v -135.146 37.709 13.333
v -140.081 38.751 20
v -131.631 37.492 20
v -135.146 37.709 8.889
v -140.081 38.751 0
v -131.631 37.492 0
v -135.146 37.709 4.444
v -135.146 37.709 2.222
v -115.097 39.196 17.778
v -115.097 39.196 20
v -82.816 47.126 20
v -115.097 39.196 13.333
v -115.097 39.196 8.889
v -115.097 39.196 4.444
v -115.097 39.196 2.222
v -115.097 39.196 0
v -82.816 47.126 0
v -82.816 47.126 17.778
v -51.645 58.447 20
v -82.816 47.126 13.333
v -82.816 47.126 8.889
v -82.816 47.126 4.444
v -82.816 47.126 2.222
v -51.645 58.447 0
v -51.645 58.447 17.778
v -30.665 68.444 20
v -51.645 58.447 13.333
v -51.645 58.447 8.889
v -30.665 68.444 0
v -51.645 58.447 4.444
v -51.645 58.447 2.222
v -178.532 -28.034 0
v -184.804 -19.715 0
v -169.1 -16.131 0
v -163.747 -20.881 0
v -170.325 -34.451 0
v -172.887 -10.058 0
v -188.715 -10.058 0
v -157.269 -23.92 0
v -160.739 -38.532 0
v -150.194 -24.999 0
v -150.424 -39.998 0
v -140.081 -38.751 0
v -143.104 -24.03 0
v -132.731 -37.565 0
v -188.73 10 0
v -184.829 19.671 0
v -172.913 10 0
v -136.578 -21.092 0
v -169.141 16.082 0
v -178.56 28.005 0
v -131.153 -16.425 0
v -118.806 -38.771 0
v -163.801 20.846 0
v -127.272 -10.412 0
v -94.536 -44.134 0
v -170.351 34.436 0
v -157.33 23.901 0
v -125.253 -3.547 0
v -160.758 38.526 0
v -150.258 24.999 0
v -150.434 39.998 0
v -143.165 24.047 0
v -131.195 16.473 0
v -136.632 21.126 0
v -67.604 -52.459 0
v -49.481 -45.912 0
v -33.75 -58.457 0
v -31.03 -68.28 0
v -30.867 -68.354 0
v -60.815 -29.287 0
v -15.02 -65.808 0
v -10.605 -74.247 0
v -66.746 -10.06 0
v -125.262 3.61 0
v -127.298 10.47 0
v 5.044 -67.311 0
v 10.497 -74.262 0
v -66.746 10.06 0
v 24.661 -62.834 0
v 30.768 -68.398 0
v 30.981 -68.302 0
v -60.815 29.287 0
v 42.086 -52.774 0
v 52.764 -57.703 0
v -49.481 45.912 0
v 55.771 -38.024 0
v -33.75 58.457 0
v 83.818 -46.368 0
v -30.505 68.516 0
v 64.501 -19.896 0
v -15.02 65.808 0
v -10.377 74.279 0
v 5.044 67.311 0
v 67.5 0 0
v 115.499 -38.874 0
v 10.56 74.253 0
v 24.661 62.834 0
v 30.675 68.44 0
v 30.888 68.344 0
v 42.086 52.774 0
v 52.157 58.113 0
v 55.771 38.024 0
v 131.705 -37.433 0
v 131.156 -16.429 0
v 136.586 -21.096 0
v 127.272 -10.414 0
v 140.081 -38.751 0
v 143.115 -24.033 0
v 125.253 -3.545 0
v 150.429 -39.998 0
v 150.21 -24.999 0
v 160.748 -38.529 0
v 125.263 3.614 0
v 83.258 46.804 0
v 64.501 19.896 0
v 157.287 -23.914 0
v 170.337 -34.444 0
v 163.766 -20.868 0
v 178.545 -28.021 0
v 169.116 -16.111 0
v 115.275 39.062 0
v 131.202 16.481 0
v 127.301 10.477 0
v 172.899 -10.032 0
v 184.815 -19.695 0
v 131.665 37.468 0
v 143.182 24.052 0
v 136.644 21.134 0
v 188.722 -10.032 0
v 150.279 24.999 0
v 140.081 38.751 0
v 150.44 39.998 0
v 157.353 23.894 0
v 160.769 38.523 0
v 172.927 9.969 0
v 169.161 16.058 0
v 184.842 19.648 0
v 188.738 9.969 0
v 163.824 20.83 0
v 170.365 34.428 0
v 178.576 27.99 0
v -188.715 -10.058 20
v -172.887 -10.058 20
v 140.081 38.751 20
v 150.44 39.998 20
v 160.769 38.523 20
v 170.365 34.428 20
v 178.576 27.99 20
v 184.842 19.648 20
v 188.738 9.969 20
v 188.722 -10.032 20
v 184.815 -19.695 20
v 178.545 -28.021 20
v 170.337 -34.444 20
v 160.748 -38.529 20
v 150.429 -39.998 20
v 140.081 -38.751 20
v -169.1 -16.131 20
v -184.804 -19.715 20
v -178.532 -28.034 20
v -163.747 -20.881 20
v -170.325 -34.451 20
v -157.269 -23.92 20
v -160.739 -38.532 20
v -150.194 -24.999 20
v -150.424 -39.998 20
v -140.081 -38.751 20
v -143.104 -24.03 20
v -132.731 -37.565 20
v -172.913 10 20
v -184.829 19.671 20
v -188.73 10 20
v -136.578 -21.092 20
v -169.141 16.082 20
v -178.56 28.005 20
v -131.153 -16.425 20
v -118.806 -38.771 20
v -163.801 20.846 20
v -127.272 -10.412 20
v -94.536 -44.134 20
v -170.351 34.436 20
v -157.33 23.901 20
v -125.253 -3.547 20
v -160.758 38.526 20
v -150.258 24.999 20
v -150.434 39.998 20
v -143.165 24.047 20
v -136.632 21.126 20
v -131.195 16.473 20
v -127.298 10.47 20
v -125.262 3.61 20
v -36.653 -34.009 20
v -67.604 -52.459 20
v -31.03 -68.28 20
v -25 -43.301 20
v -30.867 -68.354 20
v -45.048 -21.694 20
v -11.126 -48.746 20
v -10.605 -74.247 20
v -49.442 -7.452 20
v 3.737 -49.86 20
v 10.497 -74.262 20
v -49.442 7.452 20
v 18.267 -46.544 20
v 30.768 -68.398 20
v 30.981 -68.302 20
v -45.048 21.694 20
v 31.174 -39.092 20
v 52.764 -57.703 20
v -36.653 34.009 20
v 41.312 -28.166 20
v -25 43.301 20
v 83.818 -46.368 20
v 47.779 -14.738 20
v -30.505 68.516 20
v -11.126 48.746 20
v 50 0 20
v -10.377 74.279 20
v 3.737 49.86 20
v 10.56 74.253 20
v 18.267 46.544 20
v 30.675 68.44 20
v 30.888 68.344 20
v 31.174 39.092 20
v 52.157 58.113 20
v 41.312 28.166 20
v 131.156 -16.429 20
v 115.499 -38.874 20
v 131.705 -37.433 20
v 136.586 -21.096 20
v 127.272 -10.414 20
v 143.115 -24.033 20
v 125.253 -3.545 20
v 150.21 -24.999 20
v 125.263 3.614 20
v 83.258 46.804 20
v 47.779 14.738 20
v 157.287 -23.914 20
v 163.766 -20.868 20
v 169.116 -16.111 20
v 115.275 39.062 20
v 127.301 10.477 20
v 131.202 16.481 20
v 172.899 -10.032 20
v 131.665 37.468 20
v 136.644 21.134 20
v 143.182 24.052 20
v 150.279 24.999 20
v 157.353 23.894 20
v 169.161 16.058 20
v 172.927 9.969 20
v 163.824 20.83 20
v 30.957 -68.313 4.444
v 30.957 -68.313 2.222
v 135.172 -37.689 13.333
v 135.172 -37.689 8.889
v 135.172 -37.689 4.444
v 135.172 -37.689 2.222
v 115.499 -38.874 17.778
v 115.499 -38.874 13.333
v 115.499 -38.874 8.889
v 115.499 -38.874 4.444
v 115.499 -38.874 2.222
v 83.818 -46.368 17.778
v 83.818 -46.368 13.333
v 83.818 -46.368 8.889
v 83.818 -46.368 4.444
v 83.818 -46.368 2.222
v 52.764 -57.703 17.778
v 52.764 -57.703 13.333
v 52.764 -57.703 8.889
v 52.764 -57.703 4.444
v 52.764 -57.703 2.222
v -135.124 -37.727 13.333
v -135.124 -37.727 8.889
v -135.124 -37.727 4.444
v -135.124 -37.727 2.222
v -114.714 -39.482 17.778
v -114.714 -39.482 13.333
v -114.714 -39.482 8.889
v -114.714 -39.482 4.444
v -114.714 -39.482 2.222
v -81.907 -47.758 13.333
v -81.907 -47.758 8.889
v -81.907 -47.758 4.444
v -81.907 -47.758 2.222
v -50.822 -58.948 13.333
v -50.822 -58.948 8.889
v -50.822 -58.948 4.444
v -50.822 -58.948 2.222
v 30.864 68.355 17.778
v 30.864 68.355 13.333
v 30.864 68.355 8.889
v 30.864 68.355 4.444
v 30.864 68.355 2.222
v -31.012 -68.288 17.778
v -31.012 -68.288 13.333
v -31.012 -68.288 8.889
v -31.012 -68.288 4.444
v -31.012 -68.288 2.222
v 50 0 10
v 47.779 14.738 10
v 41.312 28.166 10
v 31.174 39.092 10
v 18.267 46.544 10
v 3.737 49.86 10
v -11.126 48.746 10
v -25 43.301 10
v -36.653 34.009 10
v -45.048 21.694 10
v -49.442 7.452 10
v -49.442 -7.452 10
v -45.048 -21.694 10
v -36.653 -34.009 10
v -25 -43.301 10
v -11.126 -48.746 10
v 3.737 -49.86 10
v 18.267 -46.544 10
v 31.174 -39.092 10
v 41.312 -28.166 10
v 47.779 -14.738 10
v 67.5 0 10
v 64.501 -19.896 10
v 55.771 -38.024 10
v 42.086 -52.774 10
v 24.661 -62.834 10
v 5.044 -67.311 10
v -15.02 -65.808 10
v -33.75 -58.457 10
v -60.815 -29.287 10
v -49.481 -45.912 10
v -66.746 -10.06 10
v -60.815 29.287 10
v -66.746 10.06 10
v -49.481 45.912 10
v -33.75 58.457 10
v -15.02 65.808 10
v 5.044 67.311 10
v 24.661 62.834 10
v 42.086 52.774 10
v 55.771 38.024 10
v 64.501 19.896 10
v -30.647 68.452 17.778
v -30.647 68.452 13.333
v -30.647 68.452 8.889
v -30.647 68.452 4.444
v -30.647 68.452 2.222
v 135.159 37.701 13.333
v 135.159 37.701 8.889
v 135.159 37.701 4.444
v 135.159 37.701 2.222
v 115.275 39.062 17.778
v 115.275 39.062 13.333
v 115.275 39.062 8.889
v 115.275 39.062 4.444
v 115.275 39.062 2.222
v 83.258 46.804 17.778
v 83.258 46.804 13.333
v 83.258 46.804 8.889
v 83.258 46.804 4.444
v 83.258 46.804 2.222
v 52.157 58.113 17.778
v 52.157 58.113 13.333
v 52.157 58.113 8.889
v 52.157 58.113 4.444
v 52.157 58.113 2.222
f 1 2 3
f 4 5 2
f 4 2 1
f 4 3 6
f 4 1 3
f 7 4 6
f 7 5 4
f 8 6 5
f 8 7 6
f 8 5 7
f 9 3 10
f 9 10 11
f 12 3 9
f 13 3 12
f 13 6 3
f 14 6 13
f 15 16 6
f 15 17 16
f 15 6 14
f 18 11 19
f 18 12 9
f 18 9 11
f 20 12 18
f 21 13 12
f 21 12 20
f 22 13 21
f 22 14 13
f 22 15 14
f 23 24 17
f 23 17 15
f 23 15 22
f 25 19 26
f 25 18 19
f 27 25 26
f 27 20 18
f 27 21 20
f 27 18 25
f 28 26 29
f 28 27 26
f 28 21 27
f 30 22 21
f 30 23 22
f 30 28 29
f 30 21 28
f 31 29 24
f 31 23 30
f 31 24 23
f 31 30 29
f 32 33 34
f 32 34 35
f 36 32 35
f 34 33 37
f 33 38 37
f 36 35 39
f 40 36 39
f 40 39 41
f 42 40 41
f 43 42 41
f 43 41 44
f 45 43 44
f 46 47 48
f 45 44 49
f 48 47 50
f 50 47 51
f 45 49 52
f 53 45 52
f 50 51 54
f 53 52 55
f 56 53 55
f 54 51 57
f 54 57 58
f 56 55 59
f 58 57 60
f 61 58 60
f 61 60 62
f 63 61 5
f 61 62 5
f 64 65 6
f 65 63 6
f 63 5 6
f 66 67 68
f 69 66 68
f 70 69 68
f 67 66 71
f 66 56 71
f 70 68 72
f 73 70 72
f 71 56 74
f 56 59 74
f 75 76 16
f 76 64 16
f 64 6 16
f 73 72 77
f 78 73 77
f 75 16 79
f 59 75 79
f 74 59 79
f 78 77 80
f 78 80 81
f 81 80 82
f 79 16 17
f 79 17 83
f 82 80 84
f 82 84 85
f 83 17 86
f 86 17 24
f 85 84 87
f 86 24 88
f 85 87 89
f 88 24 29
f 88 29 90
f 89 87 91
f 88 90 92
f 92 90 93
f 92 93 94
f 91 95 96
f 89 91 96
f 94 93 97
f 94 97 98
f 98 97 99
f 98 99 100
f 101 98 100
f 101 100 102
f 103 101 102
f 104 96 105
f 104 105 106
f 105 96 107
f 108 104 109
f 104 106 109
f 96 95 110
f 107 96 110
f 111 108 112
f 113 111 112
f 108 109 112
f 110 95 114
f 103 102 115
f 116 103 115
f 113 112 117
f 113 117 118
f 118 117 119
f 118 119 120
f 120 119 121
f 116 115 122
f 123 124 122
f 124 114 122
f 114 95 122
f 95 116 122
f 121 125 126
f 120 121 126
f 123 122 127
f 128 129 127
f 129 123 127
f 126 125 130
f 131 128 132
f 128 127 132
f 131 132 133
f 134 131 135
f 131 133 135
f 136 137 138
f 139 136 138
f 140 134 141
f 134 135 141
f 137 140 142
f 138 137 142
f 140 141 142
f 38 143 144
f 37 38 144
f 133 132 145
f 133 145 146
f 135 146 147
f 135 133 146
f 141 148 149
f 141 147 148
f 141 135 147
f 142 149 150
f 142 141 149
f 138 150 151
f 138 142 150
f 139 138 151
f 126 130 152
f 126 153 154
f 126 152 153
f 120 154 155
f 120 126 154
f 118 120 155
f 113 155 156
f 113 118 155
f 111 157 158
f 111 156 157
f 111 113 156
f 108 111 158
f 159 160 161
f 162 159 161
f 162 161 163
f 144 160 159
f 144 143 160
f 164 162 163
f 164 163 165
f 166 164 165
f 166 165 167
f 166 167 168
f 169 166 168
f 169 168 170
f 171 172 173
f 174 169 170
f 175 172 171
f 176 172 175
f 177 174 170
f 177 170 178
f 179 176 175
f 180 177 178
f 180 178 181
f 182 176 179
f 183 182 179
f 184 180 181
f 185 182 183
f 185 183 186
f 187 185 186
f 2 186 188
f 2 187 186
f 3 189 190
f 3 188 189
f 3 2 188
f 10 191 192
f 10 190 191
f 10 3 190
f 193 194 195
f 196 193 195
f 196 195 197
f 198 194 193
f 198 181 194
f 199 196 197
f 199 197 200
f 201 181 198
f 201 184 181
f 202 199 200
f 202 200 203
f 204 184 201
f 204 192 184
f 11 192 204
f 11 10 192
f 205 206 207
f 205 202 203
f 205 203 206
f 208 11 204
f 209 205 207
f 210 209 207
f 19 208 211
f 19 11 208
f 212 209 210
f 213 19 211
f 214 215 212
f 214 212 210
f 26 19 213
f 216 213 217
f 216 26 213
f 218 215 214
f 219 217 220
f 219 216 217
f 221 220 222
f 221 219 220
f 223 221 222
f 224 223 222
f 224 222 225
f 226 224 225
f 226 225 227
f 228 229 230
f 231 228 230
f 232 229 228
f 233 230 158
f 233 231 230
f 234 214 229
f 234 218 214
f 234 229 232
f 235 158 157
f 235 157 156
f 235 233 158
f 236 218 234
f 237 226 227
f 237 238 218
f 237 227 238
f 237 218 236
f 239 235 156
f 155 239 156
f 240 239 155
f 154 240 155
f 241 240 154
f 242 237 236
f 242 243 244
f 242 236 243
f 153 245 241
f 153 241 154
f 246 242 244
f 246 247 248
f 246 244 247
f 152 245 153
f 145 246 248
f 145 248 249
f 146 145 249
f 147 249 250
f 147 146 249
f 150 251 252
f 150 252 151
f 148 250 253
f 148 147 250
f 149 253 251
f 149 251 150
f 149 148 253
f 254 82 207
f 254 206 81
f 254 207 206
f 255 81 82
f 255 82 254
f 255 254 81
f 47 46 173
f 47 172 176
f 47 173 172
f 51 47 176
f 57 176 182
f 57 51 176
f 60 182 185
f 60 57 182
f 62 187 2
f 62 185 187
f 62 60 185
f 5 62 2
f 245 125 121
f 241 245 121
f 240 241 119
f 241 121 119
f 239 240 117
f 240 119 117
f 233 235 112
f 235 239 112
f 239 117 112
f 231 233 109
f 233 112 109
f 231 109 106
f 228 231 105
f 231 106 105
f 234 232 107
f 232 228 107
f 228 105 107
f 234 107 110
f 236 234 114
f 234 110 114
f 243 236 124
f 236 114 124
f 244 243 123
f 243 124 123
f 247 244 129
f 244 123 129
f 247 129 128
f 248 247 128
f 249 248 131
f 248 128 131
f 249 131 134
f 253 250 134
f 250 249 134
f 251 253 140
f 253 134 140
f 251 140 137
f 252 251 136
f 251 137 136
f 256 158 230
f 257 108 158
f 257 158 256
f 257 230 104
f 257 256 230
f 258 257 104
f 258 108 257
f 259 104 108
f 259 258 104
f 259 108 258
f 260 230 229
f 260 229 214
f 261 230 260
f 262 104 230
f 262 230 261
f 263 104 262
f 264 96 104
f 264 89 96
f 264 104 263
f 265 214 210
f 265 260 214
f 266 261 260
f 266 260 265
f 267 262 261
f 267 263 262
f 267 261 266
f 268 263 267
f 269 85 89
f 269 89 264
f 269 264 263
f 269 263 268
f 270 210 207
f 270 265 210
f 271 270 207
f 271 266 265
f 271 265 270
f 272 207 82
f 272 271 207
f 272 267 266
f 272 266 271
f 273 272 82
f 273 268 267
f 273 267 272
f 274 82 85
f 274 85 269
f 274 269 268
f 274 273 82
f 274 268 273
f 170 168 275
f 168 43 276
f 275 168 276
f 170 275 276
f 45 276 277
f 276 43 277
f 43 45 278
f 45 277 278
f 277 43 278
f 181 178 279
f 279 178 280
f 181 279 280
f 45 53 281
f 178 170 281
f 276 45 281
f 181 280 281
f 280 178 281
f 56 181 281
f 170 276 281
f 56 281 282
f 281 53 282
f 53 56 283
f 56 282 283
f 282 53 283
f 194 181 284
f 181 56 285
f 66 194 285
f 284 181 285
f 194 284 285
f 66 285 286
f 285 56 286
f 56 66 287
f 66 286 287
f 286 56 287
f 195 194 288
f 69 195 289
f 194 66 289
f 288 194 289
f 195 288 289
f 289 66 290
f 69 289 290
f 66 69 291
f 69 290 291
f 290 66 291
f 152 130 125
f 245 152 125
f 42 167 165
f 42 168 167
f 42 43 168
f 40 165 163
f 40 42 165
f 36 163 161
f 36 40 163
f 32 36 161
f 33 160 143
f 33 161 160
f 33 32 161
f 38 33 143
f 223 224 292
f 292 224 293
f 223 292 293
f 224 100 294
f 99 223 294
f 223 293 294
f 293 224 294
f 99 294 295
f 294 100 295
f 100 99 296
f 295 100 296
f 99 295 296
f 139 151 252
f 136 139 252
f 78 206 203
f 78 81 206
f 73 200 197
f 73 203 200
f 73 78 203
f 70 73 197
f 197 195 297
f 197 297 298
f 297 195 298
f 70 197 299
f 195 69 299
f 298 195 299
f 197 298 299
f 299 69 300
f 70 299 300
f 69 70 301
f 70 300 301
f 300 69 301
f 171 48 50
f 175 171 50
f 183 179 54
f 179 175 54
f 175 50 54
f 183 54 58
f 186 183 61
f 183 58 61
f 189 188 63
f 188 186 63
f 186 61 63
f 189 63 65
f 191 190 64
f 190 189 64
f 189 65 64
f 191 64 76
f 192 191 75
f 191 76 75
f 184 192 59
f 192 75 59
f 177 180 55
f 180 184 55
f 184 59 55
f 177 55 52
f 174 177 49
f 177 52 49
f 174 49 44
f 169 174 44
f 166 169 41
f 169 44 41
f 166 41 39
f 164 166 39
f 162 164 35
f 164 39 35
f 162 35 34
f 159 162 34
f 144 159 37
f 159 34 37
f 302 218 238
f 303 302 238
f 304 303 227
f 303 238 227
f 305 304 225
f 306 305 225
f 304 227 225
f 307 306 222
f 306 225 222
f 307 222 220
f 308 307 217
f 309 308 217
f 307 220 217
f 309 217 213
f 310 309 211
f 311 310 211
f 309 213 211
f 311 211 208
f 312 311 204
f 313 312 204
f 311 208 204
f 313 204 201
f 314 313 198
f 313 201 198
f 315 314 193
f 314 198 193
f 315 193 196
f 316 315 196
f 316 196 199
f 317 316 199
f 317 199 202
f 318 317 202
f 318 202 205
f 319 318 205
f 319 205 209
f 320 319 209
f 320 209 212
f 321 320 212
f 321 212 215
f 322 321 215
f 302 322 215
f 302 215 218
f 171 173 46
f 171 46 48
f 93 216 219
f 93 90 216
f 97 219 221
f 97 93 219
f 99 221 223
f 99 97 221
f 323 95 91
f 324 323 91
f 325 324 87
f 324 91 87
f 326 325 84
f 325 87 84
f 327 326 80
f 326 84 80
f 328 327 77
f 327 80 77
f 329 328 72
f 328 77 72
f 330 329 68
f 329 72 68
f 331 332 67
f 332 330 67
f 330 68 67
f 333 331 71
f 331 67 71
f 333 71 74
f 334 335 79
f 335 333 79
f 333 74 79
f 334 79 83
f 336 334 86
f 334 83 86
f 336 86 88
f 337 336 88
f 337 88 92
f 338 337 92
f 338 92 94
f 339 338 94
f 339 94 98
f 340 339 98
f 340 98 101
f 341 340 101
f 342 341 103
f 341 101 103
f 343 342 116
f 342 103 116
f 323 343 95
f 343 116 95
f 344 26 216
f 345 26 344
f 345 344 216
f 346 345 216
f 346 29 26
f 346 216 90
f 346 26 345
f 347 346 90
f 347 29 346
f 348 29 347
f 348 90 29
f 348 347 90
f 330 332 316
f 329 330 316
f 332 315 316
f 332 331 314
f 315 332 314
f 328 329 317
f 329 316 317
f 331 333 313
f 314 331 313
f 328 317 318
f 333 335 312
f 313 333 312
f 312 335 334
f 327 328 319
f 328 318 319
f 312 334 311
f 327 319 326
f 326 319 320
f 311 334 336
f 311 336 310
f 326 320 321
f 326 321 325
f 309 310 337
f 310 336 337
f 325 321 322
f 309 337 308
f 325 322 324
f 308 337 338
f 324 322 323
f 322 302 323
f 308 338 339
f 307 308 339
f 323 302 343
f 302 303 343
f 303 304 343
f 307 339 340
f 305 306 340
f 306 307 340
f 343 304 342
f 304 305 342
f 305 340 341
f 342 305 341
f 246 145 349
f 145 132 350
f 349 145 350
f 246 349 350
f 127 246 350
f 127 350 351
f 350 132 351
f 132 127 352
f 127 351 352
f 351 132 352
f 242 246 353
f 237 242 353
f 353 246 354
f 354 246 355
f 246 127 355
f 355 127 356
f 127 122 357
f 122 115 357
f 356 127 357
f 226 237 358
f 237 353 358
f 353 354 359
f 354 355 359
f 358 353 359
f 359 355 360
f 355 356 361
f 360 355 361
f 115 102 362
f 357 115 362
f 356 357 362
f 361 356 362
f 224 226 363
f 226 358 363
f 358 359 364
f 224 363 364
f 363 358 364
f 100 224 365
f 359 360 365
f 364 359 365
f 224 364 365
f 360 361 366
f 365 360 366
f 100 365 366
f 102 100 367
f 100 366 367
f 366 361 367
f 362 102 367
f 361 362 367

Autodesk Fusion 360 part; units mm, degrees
sketch "Sketch1" plane through (0, 0, 0) normal (0, 0, 1) x (1, 0, 0)
  circle A0 centre (0, 0) radius 50
  circle A1 centre (0, 0) radius 67.5
  line L0 (-188.7298, 10) -> (-172.9129, 10)
  line L1 (-188.7147, -10.0585) -> (-172.8873, -10.0585)
  arc A2 (-172.8873, -10.0585) -> (-172.9129, 10) centre (-150, 0) ccw
  line L2 (190, -0.0314) -> (190, 0.0314)
  line L3 (188.7379, 9.9686) -> (172.9266, 9.9686)
  line L4 (188.7216, -10.0319) -> (172.8989, -10.0319)
  arc A3 (190, -0.0314) -> (190, 0.0314) centre (150, 0) ccw
  arc A4 (172.9266, 9.9686) -> (172.8989, -10.0319) centre (150, 0) ccw
  spline S0 degree 5 poles (-140.0807, 38.7506) (-138.5307, 38.3538) (-135.4703, 37.4053) (-128.0478, 36.7264) (-108.2202, 39.6197) (-74.7434, 48.8035) (-51.6098, 57.8401) (-40.0528, 63.8063) (-33.7446, 67.0737) (-30.5053, 68.5159) knots 0 0 0 0 0 0 0.2 0.4 0.6 0.8 1 1 1 1 1 1
  line L5 (-43.0547, 62.9285) -> (-17.9559, 74.1033)
  spline S1 degree 5 poles (-140.0807, -38.7506) (-138.5307, -38.3538) (-135.4703, -37.4053) (-127.9422, -36.808) (-107.6532, -40.0429) (-73.5767, -49.609) (-50.5343, -58.4957) (-39.5693, -64.0411) (-33.8156, -67.0222) (-30.867, -68.3537) knots 0 0 0 0 0 0 0.2 0.4 0.6 0.8 1 1 1 1 1 1
  line L6 (-42.1759, -63.2468) -> (-19.558, -73.4606)
  arc A5 (-188.7147, -10.0585) -> (-140.0807, -38.7506) centre (-150, 0) ccw
  arc A6 (-140.0807, 38.7506) -> (-188.7298, 10) centre (-150, 0) ccw
  spline S2 degree 5 poles (140.0807, 38.7506) (138.5307, 38.3538) (135.4703, 37.4053) (128.0873, 36.6912) (108.4368, 39.4331) (75.2221, 48.4229) (52.131, 57.4751) (40.4396, 63.5816) (33.9896, 66.9545) (30.6746, 68.4403) knots 0 0 0 0 0 0 0.2 0.4 0.6 0.8 1 1 1 1 1 1
  line L7 (43.2705, 62.7948) -> (18.0787, 74.0857)
  spline S3 degree 5 poles (140.0807, -38.7506) (138.5307, -38.3538) (135.4703, -37.4053) (128.1469, -36.639) (108.7618, -39.1583) (75.9243, -47.8755) (52.8578, -56.976) (40.9168, -63.3105) (34.2161, -66.8472) (30.768, -68.3983) knots 0 0 0 0 0 0 0.2 0.4 0.6 0.8 1 1 1 1 1 1
  line L8 (43.6214, -62.6164) -> (17.9147, -74.1802)
  arc A7 (188.7379, 9.9686) -> (140.0807, 38.7506) centre (150, 0) ccw
  arc A8 (140.0807, -38.7506) -> (188.7216, -10.0319) centre (150, 0) ccw
  arc A9 (-31.0302, -68.2798) -> (30.9809, -68.3022) centre (0, 0) ccw
  arc A10 (30.8878, 68.3443) -> (-30.6651, 68.4445) centre (0, 0) ccw
sketch "Esboço2" plane through (0, 0, 0) normal (0, 0, 1) x (1, 0, 0)
extrude "Extrusão1" add sketch "Sketch1" along normal blind 20 contours L0 L1 A2 L3 L4 A4 S0 L5 S1 L6 A5 A6 S2 L7 S3 L8 A7 A8 A9 A10
sketch "Esboço3" plane through (0, 0, 20) normal (0, 0, 1) x (1, 0, 0)
  circle A0 centre (0, 0) radius 67.5
  arc A1 (188.7379, 9.9686) -> (140.0807, 38.7506) centre (150, 0) ccw
  spline S0 degree 5 poles (140.0807, 38.7506) (138.5307, 38.3538) (135.4703, 37.4053) (128.0873, 36.6912) (108.4368, 39.4331) (75.3076, 48.3997) (52.2797, 57.4168) (40.5904, 63.503) (34.1559, 66.8675) (30.8878, 68.3443) knots 0 0 0 0 0 0 0.2 0.4 0.6 0.8 0.997426 0.997426 0.997426 0.997426 0.997426 0.997426
  arc A2 (30.8878, 68.3443) -> (-30.6651, 68.4445) centre (0, 0) ccw
  spline S1 degree 5 poles (-30.6651, 68.4445) (-33.8694, 67.009) (-40.1671, 63.7474) (-51.7241, 57.7955) (-74.8095, 48.7854) (-108.2202, 39.6197) (-128.0478, 36.7264) (-135.4703, 37.4053) (-138.5307, 38.3538) (-140.0807, 38.7506) knots -0.998025 -0.998025 -0.998025 -0.998025 -0.998025 -0.998025 -0.8 -0.6 -0.4 -0.2 0 0 0 0 0 0
  arc A3 (-140.0807, 38.7506) -> (-188.7298, 10) centre (-150, 0) ccw
  line L0 (-188.7298, 10) -> (-172.9129, 10)
  arc A4 (-172.8873, -10.0585) -> (-172.9129, 10) centre (-150, 0) ccw
  line L1 (-172.8873, -10.0585) -> (-188.7147, -10.0585)
  arc A5 (-188.7147, -10.0585) -> (-140.0807, -38.7506) centre (-150, 0) ccw
  spline S2 degree 5 poles (-140.0807, -38.7506) (-138.5307, -38.3538) (-135.4703, -37.4053) (-127.9422, -36.808) (-107.6532, -40.0429) (-73.6522, -49.5878) (-50.662, -58.4465) (-39.691, -63.9796) (-33.9434, -66.956) (-31.0302, -68.2798) knots 0 0 0 0 0 0 0.2 0.4 0.6 0.8 0.997784 0.997784 0.997784 0.997784 0.997784 0.997784
  arc A6 (-31.0302, -68.2798) -> (30.9809, -68.3022) centre (0, 0) ccw
  spline S3 degree 5 poles (30.9809, -68.3022) (34.382, -66.7597) (41.0646, -63.2323) (53.0003, -56.9198) (76.0055, -47.854) (108.7618, -39.1583) (128.1469, -36.639) (135.4703, -37.4053) (138.5307, -38.3538) (140.0807, -38.7506) knots -0.997529 -0.997529 -0.997529 -0.997529 -0.997529 -0.997529 -0.8 -0.6 -0.4 -0.2 0 0 0 0 0 0
  arc A7 (140.0807, -38.7506) -> (188.7216, -10.0319) centre (150, 0) ccw
  line L2 (188.7216, -10.0319) -> (172.8989, -10.0319)
  arc A8 (172.9266, 9.9686) -> (172.8989, -10.0319) centre (150, 0) ccw
  line L3 (172.9266, 9.9686) -> (188.7379, 9.9686)
  circle A9 centre (0, 0) radius 67.8
  circle A10 centre (0, 0) radius 50
  dimension "d17" = 135.6
  dimension "d18" = 100
extrude "Extrusão2" add sketch "Esboço3" against normal blind 10 contours A0
